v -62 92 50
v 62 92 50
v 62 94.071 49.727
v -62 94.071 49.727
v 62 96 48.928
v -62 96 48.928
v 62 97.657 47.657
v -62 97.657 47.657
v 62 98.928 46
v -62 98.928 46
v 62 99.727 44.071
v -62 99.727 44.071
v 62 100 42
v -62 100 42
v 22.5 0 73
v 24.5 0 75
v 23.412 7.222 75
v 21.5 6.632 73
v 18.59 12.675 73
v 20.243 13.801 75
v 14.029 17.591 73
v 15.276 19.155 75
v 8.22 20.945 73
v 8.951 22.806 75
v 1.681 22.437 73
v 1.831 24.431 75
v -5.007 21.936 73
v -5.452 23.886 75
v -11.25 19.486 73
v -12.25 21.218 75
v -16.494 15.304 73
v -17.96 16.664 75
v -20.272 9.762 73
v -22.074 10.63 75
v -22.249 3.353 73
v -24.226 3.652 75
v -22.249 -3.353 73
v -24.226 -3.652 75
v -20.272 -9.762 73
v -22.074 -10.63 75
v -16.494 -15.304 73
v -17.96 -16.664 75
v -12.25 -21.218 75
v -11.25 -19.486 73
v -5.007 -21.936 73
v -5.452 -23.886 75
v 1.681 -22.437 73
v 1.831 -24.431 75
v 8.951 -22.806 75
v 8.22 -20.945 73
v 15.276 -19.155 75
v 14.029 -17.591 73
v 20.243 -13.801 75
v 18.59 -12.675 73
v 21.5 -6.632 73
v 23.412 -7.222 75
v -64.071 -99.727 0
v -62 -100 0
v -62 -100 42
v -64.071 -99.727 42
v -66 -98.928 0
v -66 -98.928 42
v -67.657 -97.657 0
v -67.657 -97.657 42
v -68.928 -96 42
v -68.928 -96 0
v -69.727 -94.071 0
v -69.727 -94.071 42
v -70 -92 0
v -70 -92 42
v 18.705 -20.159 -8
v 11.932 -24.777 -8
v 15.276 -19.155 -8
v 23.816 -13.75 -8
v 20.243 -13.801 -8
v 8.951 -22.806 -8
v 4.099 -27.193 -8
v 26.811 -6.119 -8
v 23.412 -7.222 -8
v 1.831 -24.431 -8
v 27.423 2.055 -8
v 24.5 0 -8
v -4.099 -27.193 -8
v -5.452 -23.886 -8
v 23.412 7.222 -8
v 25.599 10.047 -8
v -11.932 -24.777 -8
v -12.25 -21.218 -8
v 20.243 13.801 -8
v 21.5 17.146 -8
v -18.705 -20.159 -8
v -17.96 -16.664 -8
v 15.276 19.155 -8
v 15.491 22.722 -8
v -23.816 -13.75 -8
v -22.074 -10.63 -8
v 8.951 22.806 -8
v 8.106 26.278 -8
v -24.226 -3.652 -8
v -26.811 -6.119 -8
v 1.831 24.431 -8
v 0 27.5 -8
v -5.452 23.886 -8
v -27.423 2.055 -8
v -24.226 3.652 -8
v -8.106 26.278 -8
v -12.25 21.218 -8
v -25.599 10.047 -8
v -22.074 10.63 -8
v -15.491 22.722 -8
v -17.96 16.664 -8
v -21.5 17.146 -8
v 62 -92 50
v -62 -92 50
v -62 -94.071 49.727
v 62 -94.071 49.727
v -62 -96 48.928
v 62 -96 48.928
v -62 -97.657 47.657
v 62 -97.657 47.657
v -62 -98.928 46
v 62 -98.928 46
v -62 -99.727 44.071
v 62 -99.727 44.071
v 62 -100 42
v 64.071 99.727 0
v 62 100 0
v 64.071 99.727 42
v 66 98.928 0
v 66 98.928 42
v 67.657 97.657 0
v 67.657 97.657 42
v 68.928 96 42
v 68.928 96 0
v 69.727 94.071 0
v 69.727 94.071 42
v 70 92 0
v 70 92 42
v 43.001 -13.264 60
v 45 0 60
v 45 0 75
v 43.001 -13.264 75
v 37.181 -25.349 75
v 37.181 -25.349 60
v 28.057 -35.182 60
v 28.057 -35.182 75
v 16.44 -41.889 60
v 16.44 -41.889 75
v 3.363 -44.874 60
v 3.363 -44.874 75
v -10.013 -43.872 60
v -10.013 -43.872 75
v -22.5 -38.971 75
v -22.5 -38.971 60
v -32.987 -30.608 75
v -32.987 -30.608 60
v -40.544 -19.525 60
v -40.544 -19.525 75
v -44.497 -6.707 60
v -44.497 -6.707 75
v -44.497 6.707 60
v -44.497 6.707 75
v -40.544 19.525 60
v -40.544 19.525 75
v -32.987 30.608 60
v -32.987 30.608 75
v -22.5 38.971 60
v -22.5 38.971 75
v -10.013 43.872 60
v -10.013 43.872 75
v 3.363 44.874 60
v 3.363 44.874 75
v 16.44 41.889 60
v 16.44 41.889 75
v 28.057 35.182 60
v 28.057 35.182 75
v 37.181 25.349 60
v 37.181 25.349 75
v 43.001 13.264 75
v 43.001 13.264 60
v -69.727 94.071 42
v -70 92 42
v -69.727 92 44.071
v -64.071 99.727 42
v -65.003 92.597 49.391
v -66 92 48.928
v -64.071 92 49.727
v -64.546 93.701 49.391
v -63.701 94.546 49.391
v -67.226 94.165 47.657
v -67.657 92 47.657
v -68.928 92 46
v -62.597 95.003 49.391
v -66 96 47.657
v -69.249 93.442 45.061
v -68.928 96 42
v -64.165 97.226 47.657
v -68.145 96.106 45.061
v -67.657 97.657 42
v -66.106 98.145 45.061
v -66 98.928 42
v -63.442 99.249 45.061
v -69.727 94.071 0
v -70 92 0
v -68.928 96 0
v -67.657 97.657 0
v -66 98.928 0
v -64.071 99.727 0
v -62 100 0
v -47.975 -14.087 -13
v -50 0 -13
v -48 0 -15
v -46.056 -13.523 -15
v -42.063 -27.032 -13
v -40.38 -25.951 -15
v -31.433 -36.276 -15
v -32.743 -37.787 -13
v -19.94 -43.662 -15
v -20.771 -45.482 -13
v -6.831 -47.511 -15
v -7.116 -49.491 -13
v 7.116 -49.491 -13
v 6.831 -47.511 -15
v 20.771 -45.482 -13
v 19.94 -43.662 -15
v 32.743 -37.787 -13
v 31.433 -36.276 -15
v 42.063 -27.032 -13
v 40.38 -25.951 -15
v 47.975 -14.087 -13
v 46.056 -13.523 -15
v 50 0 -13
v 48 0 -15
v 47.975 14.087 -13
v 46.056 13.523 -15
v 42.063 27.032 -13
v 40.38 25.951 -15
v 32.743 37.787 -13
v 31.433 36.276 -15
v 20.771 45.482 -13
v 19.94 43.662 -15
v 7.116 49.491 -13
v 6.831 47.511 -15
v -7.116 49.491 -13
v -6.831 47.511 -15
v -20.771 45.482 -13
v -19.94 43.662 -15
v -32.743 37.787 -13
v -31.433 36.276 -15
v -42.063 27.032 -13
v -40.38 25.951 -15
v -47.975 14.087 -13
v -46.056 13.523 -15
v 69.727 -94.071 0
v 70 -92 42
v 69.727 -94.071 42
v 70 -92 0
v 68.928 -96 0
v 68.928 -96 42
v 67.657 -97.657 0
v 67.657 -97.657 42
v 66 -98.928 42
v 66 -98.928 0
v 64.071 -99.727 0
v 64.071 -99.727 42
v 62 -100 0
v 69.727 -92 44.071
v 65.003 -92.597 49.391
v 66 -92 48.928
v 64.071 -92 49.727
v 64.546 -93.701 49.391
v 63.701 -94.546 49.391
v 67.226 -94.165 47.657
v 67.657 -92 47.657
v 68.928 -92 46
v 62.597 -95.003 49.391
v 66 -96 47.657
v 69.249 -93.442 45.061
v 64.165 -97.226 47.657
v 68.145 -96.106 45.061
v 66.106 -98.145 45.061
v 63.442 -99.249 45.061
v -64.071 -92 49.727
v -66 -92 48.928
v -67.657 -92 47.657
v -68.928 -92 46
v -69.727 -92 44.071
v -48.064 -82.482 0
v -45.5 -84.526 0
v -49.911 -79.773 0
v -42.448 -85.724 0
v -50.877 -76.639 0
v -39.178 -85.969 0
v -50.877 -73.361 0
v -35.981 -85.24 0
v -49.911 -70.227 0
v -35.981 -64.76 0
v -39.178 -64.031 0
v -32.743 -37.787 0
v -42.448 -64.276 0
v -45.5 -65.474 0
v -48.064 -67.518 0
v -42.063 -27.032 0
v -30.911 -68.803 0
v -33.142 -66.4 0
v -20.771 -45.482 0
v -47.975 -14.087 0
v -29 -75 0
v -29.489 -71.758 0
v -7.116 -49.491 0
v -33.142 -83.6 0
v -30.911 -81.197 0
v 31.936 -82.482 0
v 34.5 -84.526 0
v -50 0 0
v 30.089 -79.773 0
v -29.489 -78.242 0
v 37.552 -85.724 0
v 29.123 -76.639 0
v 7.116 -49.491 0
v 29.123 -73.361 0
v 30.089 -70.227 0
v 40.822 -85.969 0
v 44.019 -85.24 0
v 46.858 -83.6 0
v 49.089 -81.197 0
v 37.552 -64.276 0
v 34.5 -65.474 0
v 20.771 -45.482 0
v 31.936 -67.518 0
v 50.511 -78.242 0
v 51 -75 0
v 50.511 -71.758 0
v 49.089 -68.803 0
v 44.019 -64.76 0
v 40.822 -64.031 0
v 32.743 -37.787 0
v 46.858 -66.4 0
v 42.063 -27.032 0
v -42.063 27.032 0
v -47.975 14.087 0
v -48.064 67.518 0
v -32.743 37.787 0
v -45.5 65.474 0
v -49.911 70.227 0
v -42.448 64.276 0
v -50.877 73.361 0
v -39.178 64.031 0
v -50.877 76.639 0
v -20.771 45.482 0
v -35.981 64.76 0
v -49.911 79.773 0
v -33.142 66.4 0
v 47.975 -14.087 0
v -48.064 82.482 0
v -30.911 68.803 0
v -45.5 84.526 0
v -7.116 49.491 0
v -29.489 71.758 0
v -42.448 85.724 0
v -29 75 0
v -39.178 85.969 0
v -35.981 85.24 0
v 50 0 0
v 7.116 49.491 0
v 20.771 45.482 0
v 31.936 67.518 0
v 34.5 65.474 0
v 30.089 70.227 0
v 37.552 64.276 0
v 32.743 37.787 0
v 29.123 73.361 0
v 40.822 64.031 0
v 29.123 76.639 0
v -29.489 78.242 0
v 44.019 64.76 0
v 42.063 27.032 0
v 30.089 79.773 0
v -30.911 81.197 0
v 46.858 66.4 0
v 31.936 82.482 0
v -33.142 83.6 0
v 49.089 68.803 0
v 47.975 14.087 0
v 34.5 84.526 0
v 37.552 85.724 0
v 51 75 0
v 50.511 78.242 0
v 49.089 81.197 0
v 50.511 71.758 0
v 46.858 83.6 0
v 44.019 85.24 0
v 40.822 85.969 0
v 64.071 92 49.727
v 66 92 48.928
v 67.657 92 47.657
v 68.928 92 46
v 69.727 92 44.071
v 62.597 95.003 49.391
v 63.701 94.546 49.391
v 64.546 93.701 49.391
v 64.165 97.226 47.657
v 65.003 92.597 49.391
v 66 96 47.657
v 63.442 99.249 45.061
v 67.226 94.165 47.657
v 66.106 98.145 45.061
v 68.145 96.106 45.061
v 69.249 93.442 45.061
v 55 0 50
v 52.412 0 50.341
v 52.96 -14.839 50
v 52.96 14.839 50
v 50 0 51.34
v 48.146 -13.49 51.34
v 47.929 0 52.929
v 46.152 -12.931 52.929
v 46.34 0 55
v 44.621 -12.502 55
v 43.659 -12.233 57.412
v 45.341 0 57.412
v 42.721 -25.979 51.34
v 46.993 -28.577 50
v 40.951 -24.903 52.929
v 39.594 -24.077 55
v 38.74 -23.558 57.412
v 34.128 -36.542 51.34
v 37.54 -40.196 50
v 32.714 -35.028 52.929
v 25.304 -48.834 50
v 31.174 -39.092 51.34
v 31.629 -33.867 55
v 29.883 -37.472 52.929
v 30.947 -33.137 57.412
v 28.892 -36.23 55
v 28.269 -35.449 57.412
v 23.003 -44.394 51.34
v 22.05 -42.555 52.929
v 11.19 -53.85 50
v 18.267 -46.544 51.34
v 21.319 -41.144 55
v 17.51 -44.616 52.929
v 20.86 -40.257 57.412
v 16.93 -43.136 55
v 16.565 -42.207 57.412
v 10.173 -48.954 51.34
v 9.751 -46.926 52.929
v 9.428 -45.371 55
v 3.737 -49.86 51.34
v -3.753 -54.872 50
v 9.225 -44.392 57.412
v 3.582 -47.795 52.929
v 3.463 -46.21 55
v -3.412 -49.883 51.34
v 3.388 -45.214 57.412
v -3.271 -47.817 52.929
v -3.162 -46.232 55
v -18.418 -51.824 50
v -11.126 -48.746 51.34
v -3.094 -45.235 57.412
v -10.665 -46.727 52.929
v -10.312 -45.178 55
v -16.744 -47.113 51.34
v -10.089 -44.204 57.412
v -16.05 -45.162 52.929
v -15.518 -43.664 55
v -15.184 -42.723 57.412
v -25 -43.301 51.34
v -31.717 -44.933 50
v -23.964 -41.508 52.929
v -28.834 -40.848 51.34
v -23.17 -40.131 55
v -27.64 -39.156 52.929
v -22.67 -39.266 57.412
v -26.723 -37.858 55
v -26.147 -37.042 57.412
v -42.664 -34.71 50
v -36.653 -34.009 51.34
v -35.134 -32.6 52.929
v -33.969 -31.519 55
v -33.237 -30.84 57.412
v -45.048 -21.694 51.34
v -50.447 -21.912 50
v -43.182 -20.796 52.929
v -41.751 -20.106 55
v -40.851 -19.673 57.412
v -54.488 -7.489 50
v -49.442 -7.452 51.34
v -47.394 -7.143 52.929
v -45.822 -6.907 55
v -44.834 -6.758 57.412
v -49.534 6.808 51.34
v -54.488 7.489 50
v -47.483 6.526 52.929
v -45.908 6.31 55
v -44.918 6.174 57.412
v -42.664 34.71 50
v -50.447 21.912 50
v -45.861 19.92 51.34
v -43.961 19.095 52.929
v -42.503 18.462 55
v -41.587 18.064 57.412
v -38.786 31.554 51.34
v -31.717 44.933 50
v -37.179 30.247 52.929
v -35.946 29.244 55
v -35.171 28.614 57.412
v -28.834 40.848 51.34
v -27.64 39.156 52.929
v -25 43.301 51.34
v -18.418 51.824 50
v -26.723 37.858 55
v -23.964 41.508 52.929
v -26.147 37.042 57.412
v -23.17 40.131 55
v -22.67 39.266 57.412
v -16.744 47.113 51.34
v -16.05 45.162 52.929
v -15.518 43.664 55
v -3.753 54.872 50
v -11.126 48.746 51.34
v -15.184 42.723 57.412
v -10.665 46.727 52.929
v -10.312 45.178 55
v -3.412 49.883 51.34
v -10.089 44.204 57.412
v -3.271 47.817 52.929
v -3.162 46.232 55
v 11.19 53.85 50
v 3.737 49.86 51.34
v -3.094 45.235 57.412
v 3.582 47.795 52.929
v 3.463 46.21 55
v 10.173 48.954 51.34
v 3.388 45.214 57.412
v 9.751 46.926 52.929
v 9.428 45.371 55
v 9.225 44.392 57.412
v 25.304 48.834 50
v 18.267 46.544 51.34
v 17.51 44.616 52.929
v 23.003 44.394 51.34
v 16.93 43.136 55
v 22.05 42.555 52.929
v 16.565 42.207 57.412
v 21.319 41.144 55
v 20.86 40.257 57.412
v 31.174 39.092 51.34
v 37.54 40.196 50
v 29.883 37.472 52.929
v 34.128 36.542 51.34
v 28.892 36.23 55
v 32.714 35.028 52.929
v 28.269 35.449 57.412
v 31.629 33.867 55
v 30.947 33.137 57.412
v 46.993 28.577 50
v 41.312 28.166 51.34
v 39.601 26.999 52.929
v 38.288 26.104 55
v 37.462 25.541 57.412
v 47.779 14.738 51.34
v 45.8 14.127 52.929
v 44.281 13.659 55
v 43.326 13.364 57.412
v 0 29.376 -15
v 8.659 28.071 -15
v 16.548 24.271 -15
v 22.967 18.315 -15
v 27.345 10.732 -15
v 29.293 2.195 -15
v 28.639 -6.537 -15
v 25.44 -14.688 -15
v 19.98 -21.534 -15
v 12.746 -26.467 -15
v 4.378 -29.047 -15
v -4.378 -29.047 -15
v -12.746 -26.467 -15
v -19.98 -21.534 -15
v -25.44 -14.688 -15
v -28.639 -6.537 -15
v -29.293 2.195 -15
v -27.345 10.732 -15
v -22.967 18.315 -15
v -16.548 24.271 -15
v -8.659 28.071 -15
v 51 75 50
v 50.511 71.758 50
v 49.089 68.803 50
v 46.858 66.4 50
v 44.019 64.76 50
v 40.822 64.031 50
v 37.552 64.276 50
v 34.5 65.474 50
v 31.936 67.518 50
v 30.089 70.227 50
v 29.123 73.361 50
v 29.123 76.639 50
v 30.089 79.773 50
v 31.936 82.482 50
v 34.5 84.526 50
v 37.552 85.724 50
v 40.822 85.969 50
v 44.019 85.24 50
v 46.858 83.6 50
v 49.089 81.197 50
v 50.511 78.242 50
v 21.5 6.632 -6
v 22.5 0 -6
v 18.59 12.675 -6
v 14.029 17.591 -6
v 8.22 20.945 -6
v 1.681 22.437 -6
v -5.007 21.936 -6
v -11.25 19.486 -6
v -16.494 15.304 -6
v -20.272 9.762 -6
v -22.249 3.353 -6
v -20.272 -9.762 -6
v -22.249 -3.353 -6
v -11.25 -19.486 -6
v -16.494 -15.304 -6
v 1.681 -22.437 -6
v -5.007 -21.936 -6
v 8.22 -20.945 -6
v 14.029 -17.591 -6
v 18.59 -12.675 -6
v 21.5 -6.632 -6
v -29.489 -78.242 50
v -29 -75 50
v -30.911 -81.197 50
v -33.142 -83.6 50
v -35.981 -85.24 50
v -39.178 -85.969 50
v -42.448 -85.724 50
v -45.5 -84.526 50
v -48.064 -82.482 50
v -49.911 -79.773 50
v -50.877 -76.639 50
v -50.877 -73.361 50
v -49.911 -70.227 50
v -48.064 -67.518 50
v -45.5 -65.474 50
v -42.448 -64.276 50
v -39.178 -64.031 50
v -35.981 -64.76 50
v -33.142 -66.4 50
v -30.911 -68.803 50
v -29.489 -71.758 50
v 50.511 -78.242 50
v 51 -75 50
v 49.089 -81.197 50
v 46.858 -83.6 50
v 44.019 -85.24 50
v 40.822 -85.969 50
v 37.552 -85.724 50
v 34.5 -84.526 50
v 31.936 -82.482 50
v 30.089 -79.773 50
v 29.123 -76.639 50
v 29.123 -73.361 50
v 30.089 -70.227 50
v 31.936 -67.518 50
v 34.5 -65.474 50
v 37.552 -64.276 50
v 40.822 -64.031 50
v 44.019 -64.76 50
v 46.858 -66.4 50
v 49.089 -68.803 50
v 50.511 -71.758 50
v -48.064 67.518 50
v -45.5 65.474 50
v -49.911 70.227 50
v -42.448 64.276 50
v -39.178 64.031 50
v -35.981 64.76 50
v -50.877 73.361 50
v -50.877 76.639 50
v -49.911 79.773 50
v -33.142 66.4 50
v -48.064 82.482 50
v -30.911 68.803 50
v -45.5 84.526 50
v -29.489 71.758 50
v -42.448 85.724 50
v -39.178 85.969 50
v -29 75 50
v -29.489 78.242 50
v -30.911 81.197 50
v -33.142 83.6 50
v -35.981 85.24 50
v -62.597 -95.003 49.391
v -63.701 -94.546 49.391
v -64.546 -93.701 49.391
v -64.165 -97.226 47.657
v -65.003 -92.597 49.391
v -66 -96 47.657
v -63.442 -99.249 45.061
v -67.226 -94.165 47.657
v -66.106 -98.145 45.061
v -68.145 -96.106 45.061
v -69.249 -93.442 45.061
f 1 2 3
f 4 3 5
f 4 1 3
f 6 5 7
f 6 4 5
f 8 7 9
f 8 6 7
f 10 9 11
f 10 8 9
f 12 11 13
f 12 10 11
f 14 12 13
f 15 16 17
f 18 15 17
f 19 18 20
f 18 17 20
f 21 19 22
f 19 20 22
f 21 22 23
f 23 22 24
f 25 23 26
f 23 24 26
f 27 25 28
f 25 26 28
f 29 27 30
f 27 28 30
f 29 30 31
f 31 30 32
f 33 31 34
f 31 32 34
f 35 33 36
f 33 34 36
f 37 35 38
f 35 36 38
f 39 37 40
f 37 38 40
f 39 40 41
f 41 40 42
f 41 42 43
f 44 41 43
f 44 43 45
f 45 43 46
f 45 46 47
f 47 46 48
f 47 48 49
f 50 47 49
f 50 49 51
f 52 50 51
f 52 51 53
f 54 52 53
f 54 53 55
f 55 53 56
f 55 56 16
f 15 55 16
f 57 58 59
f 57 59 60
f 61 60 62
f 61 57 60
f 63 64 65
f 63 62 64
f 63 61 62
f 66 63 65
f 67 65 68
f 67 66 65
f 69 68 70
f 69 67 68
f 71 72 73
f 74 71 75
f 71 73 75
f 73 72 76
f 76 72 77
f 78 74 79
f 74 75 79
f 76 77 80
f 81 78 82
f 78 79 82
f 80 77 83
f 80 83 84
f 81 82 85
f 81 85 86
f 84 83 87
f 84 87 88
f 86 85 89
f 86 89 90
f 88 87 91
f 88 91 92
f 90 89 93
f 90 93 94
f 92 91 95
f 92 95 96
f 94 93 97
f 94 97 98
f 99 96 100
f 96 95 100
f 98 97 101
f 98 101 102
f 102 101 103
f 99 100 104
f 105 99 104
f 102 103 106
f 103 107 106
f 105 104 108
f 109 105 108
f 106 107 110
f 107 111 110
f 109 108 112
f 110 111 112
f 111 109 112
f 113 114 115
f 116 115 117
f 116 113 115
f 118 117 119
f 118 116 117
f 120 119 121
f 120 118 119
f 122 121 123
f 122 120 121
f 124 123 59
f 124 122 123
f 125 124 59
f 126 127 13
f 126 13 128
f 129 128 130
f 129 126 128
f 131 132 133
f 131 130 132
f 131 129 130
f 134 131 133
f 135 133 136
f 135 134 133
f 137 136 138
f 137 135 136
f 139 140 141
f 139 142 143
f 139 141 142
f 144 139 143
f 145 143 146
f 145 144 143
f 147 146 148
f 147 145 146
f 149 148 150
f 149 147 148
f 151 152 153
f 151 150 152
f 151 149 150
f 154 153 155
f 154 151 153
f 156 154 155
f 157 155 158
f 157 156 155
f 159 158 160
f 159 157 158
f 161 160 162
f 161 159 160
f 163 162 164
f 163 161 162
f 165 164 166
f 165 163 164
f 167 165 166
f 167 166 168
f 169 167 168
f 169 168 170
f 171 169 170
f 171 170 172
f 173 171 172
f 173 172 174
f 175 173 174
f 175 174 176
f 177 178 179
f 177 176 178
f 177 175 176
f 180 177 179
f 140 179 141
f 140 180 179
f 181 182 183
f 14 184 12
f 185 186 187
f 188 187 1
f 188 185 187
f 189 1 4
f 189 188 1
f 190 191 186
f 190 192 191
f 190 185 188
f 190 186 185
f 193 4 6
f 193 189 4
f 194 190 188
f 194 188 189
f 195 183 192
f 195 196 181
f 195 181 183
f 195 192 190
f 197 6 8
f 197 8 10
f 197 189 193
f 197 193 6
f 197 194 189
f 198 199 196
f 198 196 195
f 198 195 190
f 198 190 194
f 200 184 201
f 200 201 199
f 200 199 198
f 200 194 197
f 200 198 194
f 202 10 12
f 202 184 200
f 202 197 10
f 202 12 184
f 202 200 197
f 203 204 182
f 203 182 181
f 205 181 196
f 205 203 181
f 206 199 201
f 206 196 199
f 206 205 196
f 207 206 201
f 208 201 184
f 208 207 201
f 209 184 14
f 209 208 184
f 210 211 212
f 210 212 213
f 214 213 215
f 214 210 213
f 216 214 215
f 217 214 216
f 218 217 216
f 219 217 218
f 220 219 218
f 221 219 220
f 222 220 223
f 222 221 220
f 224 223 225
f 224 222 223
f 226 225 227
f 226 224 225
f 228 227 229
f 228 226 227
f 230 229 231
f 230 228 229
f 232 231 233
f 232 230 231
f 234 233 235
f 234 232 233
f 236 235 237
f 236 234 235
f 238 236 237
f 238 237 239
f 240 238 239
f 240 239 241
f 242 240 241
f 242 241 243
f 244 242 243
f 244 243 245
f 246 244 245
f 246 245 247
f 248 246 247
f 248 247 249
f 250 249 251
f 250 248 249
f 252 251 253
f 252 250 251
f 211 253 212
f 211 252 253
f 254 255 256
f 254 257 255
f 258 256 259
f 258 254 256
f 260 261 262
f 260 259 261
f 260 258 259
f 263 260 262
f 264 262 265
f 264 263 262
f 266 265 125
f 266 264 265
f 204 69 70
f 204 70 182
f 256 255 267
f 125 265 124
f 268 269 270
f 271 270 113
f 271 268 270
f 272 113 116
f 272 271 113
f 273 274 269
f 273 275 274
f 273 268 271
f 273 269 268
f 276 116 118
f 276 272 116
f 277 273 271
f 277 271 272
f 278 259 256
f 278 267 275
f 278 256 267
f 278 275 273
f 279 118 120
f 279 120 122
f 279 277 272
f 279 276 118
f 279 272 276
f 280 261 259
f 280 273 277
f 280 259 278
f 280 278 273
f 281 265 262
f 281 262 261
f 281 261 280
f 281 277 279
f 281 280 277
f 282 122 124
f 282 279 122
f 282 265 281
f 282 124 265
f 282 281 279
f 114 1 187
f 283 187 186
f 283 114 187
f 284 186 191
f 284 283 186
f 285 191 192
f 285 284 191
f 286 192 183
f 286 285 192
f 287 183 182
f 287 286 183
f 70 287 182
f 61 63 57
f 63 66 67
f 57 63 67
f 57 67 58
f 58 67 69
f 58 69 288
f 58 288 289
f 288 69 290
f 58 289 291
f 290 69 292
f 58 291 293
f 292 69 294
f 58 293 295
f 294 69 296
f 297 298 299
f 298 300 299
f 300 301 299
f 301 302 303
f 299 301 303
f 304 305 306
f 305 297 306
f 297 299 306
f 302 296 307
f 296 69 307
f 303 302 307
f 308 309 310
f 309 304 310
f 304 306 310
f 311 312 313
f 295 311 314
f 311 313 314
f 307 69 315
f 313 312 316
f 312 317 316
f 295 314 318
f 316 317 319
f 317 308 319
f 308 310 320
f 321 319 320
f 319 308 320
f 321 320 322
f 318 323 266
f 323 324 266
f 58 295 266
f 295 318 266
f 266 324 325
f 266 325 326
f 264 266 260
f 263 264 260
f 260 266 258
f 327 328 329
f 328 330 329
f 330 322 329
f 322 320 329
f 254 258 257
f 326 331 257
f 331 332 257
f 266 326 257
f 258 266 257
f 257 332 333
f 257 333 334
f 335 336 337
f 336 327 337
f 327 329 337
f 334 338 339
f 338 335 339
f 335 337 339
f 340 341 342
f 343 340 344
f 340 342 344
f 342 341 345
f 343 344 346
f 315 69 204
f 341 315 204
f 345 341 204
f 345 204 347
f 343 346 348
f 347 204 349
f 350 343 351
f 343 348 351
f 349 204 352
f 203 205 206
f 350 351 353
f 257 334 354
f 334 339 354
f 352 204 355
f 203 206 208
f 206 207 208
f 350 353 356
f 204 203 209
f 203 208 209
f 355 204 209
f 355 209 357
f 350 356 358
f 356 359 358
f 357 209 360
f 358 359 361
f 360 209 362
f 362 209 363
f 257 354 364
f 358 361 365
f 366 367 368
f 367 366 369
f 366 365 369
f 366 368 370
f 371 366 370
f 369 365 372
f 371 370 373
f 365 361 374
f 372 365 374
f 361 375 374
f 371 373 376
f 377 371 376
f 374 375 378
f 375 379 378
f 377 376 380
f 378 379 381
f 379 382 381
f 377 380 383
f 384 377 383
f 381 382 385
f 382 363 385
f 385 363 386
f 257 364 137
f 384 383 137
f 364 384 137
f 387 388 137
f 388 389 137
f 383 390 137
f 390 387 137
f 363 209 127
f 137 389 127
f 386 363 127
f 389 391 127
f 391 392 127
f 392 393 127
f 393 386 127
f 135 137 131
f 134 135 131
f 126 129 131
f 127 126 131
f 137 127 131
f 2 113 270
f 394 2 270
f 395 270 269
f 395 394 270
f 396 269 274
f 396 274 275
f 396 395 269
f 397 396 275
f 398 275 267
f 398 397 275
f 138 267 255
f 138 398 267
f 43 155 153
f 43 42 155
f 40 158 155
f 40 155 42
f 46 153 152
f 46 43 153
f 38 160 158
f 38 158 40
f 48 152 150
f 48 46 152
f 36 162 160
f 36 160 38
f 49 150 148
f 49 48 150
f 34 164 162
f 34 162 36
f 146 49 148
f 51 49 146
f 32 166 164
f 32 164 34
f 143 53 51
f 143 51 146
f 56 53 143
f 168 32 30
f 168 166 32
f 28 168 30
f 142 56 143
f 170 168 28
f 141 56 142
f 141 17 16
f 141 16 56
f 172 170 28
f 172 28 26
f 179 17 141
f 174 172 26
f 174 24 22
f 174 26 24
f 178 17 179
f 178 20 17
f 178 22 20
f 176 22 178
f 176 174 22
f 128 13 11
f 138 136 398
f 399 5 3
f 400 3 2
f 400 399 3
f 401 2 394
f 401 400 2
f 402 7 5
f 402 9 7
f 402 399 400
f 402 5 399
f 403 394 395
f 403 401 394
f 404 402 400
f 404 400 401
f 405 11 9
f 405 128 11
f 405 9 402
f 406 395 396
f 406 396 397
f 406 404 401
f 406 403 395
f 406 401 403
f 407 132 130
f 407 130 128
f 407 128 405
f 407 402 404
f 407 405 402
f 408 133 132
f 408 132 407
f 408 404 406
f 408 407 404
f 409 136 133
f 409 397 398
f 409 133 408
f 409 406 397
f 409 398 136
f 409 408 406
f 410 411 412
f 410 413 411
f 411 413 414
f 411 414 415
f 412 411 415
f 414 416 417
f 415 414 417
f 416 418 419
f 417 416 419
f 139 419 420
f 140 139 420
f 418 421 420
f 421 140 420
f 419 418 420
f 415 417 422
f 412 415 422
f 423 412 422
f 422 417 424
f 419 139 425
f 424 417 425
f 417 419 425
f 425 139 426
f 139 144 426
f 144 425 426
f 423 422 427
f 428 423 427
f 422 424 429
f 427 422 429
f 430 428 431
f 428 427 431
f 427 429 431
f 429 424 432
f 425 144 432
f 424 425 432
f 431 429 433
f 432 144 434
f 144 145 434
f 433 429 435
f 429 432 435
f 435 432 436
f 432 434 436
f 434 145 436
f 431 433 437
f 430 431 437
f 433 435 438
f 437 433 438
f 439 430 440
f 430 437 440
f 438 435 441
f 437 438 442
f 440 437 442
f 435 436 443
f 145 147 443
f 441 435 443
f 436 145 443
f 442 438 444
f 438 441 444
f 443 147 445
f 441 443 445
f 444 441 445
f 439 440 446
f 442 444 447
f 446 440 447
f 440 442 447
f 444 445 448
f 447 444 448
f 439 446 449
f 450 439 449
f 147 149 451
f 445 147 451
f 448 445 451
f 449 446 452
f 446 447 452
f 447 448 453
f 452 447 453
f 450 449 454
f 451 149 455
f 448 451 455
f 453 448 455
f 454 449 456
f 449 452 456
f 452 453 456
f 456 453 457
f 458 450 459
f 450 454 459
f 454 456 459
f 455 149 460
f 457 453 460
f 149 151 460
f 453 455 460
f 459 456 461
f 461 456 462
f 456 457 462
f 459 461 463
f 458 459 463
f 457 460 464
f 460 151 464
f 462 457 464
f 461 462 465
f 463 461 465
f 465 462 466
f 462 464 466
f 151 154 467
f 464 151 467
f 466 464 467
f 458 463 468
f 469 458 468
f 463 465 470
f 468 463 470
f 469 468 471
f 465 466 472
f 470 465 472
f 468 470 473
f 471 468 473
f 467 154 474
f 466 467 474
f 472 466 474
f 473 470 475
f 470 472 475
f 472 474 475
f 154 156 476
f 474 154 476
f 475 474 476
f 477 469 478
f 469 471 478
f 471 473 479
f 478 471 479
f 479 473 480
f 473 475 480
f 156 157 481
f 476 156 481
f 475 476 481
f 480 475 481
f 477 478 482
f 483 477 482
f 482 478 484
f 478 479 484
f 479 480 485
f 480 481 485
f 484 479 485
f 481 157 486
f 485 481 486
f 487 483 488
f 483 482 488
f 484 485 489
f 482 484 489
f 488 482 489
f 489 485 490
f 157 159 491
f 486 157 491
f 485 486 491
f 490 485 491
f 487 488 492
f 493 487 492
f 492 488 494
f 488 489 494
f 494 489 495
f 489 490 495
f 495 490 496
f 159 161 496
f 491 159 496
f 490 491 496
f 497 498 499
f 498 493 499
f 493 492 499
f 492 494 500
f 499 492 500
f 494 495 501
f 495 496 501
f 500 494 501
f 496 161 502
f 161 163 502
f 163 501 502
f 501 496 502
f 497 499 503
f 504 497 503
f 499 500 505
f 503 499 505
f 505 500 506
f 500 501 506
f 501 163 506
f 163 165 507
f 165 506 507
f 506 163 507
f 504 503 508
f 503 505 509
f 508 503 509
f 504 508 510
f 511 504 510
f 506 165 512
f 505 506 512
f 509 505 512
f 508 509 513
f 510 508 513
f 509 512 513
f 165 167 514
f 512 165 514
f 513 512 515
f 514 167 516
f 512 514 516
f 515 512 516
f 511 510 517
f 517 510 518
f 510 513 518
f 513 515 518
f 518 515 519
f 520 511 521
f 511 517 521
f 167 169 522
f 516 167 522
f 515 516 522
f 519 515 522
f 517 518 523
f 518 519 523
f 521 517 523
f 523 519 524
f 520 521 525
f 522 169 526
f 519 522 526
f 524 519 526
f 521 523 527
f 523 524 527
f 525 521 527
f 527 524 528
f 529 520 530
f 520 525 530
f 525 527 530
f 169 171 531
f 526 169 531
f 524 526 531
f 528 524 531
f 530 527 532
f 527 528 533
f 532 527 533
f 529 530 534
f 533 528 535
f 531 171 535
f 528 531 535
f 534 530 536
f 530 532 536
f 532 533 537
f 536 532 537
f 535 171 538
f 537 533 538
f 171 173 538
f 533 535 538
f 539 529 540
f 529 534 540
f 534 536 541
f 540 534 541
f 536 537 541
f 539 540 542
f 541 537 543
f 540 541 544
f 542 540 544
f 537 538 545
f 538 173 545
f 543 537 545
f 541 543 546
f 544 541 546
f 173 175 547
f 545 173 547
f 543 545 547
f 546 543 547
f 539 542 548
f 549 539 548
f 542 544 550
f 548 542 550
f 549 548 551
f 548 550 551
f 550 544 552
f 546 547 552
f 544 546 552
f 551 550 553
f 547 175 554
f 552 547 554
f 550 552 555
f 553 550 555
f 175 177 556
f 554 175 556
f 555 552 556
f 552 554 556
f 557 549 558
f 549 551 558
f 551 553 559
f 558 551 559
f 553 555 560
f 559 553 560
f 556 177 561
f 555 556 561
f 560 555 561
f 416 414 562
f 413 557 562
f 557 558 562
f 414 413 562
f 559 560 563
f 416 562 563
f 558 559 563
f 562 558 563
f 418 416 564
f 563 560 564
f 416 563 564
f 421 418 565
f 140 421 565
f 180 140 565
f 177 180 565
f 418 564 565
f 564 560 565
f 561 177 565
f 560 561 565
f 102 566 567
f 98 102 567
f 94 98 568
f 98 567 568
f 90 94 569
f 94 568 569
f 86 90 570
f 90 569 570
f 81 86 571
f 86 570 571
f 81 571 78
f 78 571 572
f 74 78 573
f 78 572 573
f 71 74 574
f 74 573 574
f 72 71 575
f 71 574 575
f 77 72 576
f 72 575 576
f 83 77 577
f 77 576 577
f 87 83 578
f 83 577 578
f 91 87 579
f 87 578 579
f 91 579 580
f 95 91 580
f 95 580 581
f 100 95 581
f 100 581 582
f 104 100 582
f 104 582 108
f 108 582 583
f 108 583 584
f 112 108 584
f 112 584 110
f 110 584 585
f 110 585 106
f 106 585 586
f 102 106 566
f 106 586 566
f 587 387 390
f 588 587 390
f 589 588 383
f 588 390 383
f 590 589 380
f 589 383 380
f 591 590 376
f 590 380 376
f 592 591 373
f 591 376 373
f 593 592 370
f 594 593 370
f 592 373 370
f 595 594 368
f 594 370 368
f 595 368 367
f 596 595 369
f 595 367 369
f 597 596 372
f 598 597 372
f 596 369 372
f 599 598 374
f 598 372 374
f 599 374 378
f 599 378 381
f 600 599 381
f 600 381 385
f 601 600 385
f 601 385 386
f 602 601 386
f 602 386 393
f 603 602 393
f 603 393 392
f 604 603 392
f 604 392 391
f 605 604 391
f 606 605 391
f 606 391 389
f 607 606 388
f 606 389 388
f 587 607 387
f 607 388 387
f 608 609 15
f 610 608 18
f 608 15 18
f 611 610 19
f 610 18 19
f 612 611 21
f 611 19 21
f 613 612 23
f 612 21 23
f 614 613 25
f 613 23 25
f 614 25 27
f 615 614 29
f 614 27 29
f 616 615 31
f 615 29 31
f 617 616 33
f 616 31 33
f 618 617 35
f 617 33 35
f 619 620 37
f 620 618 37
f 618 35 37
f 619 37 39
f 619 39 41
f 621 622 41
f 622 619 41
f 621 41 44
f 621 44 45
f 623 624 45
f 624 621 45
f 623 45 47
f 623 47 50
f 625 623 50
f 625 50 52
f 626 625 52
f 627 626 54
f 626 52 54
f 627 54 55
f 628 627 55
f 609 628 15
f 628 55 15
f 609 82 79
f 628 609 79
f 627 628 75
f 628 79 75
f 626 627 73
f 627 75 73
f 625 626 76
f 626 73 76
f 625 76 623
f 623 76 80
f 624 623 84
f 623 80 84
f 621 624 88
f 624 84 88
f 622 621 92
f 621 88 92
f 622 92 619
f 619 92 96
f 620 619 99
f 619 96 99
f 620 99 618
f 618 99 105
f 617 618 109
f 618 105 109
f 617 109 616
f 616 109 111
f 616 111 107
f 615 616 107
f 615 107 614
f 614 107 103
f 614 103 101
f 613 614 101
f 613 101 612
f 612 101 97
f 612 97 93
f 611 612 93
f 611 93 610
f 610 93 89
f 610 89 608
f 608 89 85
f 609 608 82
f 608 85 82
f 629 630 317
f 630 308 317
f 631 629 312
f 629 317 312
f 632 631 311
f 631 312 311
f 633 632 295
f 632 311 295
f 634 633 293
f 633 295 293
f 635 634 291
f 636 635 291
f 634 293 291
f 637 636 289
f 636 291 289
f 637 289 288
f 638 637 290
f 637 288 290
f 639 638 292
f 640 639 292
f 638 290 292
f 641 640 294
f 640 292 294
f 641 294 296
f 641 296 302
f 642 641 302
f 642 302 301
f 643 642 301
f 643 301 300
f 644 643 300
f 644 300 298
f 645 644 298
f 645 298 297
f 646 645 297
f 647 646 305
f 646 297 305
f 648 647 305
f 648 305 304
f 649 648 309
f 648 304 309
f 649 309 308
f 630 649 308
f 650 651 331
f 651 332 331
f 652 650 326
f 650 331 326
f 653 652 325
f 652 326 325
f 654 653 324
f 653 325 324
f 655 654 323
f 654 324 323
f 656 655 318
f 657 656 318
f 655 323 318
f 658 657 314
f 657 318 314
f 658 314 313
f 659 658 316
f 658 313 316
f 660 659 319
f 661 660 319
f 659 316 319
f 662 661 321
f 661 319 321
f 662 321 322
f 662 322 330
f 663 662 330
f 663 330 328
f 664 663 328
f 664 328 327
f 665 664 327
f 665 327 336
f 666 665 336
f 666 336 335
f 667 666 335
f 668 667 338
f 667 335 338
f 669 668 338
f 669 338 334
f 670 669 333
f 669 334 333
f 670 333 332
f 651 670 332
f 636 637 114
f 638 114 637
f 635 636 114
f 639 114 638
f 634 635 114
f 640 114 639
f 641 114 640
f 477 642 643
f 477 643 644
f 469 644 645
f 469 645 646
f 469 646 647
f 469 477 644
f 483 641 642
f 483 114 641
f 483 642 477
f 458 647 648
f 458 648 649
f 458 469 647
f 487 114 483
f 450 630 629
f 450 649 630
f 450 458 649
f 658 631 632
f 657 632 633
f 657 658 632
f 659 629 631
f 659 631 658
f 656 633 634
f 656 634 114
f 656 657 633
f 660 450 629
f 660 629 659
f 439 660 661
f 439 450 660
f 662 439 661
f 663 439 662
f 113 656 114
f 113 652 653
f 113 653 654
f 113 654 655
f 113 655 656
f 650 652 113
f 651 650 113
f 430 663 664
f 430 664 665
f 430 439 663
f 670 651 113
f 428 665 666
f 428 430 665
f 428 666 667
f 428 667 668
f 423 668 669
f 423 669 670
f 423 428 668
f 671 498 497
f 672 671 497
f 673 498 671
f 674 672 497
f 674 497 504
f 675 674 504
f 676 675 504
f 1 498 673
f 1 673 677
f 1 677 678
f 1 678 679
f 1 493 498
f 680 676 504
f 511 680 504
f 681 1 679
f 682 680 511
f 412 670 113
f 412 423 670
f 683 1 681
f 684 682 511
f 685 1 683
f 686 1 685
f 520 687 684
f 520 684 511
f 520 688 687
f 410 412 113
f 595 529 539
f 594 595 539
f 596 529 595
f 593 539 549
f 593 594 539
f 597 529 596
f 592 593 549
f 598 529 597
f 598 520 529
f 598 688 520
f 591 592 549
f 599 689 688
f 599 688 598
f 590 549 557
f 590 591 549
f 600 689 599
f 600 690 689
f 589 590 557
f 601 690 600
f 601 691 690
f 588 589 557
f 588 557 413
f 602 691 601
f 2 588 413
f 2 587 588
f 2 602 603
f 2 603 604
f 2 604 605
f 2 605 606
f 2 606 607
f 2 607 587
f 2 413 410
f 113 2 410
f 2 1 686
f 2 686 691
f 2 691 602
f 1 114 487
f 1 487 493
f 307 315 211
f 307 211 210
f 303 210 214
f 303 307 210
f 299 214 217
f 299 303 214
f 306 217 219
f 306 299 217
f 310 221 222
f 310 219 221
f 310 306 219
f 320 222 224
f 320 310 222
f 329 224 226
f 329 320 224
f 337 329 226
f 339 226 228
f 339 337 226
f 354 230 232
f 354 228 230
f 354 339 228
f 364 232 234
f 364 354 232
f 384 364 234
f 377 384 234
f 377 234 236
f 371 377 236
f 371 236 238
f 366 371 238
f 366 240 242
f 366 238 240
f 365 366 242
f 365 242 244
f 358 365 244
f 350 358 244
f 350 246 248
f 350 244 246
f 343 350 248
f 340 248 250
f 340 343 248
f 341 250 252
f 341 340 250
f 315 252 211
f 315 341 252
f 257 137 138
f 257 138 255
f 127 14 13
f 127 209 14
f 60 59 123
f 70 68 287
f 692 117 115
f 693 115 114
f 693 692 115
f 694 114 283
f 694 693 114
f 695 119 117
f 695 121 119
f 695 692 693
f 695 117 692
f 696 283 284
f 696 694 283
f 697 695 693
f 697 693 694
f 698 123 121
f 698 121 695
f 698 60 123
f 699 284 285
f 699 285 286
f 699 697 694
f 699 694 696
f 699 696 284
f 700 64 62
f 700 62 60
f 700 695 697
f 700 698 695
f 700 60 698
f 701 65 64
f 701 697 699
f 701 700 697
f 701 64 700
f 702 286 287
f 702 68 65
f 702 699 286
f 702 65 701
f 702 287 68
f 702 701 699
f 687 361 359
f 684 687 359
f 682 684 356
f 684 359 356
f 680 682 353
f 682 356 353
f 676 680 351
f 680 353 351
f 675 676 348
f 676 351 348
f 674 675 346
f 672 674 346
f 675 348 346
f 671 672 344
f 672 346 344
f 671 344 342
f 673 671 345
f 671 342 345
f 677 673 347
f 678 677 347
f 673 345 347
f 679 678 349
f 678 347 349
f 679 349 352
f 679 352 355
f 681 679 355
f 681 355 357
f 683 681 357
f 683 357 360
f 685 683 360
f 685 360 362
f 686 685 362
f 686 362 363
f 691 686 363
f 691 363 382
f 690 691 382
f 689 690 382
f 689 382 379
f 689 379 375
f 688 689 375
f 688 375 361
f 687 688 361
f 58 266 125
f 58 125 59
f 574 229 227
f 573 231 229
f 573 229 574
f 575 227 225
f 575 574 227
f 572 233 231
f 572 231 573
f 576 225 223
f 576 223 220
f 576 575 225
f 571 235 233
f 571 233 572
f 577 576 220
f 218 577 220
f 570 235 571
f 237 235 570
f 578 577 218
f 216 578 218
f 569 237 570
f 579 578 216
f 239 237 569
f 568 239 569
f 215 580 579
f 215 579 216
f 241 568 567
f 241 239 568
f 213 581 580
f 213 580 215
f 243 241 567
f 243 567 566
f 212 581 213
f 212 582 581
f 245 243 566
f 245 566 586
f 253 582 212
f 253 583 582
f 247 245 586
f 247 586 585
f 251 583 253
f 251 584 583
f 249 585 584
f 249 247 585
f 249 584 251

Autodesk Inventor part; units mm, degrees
ref_plane "YZ Plane" through (0, 0, 0) normal (1, 0, 0) x (0, 1, 0)
ref_plane "XZ Plane" through (0, 0, 0) normal (0, 1, 0) x (-1, 0, 0)
ref_plane "XY Plane" through (0, 0, 0) normal (0, 0, 1) x (1, 0, 0)
ref_plane "РабПлоскость1" through (0, 0, 0) normal (0, 0, 1) x (1, 0, 0)
sketch "Эскиз1" plane through (0, 0, 0) normal (0, 0, 1) x (1, 0, 0)
  line L0 (-70, -92) -> (-70, 92)
  line L1 (-62, 100) -> (62, 100)
  line L2 (70, 92) -> (70, -92)
  line L3 (62, -100) -> (-62, -100)
  line L4 (-70, -100) -> (70, 100) construction
  line L5 (-70, 100) -> (70, -100) construction
  arc A0 (-62, 100) -> (-70, 92) centre (-62, 92) ccw
  arc A1 (-70, -92) -> (-62, -100) centre (-62, -92) ccw
  arc A2 (62, -100) -> (70, -92) centre (62, -92) ccw
  arc A3 (70, 92) -> (62, 100) centre (62, 92) ccw
  line L6 (0, 75) -> (-40, 75)
  line L7 (-40, 75) -> (40, 75)
  line L8 (40, 75) -> (40, -75)
  line L9 (40, -75) -> (-40, -75)
  line L10 (-40, -75) -> (-40, 75)
  circle A4 centre (-40, 75) radius 11
  circle A5 centre (40, 75) radius 11
  circle A6 centre (-40, -75) radius 11
  circle A7 centre (40, -75) radius 11
  point P0 (0, 0)
  point P1 (0, 0)
  dimension "d24" = 200
  dimension "d25" = 140
  dimension "d26" = 8
  dimension "d27" = 8
  dimension "d28" = 8
  dimension "d29" = 8
  dimension "d31" = 40
  dimension "d32" = 80
  dimension "d33" = 150
  dimension "d34" = 22
  dimension "d35" = 22
  dimension "d36" = 22
  dimension "d37" = 22
extrude "Выдавливание1" add sketch "Эскиз1" along normal blind 50 contours L0 A0 L1 A3 L2 A2 L3 A1 | L7 A5 L8 A7 L9 A6 L10 A4 L6
sketch "Эскиз2" plane through (0, 0, 0) normal (0, 0, -1) x (-1, 0, 0)
  circle A0 centre (0, 0) radius 50
  dimension "d2" = 100
extrude "Выдавливание2" add sketch "Эскиз2" along normal blind 15
sketch "Эскиз3" plane through (0, 0, 50) normal (0, 0, 1) x (1, 0, 0)
  circle A0 centre (0, 0) radius 45
  dimension "d5" = 90
extrude "Выдавливание3" add sketch "Эскиз3" along normal blind 25
fillet "Сопряжение1" radius 10 1 edges at (-45, 0, 50)
sketch "Эскиз4" plane through (0, 0, 75) normal (0, 0, 1) x (1, 0, 0)
  circle A0 centre (0, 0) radius 55 projected
  circle A1 centre (0, 0) radius 22.5
  dimension "d9" = 45
extrude "Выдавливание4" cut sketch "Эскиз4" against normal through all contours A1
chamfer "Фаска1" distance 2 angle 45 3 edges at (-22.5, 0, 75) (50, 0, -15) (-22.5, 0, -15)
sketch "Эскиз5" plane through (0, 0, 0) normal (1, 0, 0) x (0, 1, 0)
  line L0 (-24.5, -15) -> (24.5, -15) projected
  line L1 (48, -15) -> (-48, -15) projected
  line L2 (22.5, 73) -> (22.5, -13) projected
  line L3 (22.5, -15) -> (22.5, -8)
  line L4 (22.5, -8) -> (27.5, -8)
  line L5 (27.5, -8) -> (29.3756, -15)
  line L6 (0, -32.6) -> (0, 90.6) projected
  point P0 (0, 0)
  dimension "d15" = 7
  dimension "d16" = 5
  dimension "d17" = 105
revolve "Вращение1" cut sketch "Эскиз5" angle 360 about axis through (0, 0, -10) along (0, 0, 1)
chamfer "Фаска2" distance 2 angle 45 1 edges at (-22.5, 0, -8)
fillet "Сопряжение2" radius 8 8 edges at (67.6569, 97.6569, 50) (0, 100, 50) (-67.6569, 97.6569, 50) (-70, 0, 50) (-67.6569, -97.6569, 50) (0, -100, 50) (67.6569, -97.6569, 50) (70, 0, 50)
properties part number "Фланецгайка_CPY" material "Сталь, углеродистая"
